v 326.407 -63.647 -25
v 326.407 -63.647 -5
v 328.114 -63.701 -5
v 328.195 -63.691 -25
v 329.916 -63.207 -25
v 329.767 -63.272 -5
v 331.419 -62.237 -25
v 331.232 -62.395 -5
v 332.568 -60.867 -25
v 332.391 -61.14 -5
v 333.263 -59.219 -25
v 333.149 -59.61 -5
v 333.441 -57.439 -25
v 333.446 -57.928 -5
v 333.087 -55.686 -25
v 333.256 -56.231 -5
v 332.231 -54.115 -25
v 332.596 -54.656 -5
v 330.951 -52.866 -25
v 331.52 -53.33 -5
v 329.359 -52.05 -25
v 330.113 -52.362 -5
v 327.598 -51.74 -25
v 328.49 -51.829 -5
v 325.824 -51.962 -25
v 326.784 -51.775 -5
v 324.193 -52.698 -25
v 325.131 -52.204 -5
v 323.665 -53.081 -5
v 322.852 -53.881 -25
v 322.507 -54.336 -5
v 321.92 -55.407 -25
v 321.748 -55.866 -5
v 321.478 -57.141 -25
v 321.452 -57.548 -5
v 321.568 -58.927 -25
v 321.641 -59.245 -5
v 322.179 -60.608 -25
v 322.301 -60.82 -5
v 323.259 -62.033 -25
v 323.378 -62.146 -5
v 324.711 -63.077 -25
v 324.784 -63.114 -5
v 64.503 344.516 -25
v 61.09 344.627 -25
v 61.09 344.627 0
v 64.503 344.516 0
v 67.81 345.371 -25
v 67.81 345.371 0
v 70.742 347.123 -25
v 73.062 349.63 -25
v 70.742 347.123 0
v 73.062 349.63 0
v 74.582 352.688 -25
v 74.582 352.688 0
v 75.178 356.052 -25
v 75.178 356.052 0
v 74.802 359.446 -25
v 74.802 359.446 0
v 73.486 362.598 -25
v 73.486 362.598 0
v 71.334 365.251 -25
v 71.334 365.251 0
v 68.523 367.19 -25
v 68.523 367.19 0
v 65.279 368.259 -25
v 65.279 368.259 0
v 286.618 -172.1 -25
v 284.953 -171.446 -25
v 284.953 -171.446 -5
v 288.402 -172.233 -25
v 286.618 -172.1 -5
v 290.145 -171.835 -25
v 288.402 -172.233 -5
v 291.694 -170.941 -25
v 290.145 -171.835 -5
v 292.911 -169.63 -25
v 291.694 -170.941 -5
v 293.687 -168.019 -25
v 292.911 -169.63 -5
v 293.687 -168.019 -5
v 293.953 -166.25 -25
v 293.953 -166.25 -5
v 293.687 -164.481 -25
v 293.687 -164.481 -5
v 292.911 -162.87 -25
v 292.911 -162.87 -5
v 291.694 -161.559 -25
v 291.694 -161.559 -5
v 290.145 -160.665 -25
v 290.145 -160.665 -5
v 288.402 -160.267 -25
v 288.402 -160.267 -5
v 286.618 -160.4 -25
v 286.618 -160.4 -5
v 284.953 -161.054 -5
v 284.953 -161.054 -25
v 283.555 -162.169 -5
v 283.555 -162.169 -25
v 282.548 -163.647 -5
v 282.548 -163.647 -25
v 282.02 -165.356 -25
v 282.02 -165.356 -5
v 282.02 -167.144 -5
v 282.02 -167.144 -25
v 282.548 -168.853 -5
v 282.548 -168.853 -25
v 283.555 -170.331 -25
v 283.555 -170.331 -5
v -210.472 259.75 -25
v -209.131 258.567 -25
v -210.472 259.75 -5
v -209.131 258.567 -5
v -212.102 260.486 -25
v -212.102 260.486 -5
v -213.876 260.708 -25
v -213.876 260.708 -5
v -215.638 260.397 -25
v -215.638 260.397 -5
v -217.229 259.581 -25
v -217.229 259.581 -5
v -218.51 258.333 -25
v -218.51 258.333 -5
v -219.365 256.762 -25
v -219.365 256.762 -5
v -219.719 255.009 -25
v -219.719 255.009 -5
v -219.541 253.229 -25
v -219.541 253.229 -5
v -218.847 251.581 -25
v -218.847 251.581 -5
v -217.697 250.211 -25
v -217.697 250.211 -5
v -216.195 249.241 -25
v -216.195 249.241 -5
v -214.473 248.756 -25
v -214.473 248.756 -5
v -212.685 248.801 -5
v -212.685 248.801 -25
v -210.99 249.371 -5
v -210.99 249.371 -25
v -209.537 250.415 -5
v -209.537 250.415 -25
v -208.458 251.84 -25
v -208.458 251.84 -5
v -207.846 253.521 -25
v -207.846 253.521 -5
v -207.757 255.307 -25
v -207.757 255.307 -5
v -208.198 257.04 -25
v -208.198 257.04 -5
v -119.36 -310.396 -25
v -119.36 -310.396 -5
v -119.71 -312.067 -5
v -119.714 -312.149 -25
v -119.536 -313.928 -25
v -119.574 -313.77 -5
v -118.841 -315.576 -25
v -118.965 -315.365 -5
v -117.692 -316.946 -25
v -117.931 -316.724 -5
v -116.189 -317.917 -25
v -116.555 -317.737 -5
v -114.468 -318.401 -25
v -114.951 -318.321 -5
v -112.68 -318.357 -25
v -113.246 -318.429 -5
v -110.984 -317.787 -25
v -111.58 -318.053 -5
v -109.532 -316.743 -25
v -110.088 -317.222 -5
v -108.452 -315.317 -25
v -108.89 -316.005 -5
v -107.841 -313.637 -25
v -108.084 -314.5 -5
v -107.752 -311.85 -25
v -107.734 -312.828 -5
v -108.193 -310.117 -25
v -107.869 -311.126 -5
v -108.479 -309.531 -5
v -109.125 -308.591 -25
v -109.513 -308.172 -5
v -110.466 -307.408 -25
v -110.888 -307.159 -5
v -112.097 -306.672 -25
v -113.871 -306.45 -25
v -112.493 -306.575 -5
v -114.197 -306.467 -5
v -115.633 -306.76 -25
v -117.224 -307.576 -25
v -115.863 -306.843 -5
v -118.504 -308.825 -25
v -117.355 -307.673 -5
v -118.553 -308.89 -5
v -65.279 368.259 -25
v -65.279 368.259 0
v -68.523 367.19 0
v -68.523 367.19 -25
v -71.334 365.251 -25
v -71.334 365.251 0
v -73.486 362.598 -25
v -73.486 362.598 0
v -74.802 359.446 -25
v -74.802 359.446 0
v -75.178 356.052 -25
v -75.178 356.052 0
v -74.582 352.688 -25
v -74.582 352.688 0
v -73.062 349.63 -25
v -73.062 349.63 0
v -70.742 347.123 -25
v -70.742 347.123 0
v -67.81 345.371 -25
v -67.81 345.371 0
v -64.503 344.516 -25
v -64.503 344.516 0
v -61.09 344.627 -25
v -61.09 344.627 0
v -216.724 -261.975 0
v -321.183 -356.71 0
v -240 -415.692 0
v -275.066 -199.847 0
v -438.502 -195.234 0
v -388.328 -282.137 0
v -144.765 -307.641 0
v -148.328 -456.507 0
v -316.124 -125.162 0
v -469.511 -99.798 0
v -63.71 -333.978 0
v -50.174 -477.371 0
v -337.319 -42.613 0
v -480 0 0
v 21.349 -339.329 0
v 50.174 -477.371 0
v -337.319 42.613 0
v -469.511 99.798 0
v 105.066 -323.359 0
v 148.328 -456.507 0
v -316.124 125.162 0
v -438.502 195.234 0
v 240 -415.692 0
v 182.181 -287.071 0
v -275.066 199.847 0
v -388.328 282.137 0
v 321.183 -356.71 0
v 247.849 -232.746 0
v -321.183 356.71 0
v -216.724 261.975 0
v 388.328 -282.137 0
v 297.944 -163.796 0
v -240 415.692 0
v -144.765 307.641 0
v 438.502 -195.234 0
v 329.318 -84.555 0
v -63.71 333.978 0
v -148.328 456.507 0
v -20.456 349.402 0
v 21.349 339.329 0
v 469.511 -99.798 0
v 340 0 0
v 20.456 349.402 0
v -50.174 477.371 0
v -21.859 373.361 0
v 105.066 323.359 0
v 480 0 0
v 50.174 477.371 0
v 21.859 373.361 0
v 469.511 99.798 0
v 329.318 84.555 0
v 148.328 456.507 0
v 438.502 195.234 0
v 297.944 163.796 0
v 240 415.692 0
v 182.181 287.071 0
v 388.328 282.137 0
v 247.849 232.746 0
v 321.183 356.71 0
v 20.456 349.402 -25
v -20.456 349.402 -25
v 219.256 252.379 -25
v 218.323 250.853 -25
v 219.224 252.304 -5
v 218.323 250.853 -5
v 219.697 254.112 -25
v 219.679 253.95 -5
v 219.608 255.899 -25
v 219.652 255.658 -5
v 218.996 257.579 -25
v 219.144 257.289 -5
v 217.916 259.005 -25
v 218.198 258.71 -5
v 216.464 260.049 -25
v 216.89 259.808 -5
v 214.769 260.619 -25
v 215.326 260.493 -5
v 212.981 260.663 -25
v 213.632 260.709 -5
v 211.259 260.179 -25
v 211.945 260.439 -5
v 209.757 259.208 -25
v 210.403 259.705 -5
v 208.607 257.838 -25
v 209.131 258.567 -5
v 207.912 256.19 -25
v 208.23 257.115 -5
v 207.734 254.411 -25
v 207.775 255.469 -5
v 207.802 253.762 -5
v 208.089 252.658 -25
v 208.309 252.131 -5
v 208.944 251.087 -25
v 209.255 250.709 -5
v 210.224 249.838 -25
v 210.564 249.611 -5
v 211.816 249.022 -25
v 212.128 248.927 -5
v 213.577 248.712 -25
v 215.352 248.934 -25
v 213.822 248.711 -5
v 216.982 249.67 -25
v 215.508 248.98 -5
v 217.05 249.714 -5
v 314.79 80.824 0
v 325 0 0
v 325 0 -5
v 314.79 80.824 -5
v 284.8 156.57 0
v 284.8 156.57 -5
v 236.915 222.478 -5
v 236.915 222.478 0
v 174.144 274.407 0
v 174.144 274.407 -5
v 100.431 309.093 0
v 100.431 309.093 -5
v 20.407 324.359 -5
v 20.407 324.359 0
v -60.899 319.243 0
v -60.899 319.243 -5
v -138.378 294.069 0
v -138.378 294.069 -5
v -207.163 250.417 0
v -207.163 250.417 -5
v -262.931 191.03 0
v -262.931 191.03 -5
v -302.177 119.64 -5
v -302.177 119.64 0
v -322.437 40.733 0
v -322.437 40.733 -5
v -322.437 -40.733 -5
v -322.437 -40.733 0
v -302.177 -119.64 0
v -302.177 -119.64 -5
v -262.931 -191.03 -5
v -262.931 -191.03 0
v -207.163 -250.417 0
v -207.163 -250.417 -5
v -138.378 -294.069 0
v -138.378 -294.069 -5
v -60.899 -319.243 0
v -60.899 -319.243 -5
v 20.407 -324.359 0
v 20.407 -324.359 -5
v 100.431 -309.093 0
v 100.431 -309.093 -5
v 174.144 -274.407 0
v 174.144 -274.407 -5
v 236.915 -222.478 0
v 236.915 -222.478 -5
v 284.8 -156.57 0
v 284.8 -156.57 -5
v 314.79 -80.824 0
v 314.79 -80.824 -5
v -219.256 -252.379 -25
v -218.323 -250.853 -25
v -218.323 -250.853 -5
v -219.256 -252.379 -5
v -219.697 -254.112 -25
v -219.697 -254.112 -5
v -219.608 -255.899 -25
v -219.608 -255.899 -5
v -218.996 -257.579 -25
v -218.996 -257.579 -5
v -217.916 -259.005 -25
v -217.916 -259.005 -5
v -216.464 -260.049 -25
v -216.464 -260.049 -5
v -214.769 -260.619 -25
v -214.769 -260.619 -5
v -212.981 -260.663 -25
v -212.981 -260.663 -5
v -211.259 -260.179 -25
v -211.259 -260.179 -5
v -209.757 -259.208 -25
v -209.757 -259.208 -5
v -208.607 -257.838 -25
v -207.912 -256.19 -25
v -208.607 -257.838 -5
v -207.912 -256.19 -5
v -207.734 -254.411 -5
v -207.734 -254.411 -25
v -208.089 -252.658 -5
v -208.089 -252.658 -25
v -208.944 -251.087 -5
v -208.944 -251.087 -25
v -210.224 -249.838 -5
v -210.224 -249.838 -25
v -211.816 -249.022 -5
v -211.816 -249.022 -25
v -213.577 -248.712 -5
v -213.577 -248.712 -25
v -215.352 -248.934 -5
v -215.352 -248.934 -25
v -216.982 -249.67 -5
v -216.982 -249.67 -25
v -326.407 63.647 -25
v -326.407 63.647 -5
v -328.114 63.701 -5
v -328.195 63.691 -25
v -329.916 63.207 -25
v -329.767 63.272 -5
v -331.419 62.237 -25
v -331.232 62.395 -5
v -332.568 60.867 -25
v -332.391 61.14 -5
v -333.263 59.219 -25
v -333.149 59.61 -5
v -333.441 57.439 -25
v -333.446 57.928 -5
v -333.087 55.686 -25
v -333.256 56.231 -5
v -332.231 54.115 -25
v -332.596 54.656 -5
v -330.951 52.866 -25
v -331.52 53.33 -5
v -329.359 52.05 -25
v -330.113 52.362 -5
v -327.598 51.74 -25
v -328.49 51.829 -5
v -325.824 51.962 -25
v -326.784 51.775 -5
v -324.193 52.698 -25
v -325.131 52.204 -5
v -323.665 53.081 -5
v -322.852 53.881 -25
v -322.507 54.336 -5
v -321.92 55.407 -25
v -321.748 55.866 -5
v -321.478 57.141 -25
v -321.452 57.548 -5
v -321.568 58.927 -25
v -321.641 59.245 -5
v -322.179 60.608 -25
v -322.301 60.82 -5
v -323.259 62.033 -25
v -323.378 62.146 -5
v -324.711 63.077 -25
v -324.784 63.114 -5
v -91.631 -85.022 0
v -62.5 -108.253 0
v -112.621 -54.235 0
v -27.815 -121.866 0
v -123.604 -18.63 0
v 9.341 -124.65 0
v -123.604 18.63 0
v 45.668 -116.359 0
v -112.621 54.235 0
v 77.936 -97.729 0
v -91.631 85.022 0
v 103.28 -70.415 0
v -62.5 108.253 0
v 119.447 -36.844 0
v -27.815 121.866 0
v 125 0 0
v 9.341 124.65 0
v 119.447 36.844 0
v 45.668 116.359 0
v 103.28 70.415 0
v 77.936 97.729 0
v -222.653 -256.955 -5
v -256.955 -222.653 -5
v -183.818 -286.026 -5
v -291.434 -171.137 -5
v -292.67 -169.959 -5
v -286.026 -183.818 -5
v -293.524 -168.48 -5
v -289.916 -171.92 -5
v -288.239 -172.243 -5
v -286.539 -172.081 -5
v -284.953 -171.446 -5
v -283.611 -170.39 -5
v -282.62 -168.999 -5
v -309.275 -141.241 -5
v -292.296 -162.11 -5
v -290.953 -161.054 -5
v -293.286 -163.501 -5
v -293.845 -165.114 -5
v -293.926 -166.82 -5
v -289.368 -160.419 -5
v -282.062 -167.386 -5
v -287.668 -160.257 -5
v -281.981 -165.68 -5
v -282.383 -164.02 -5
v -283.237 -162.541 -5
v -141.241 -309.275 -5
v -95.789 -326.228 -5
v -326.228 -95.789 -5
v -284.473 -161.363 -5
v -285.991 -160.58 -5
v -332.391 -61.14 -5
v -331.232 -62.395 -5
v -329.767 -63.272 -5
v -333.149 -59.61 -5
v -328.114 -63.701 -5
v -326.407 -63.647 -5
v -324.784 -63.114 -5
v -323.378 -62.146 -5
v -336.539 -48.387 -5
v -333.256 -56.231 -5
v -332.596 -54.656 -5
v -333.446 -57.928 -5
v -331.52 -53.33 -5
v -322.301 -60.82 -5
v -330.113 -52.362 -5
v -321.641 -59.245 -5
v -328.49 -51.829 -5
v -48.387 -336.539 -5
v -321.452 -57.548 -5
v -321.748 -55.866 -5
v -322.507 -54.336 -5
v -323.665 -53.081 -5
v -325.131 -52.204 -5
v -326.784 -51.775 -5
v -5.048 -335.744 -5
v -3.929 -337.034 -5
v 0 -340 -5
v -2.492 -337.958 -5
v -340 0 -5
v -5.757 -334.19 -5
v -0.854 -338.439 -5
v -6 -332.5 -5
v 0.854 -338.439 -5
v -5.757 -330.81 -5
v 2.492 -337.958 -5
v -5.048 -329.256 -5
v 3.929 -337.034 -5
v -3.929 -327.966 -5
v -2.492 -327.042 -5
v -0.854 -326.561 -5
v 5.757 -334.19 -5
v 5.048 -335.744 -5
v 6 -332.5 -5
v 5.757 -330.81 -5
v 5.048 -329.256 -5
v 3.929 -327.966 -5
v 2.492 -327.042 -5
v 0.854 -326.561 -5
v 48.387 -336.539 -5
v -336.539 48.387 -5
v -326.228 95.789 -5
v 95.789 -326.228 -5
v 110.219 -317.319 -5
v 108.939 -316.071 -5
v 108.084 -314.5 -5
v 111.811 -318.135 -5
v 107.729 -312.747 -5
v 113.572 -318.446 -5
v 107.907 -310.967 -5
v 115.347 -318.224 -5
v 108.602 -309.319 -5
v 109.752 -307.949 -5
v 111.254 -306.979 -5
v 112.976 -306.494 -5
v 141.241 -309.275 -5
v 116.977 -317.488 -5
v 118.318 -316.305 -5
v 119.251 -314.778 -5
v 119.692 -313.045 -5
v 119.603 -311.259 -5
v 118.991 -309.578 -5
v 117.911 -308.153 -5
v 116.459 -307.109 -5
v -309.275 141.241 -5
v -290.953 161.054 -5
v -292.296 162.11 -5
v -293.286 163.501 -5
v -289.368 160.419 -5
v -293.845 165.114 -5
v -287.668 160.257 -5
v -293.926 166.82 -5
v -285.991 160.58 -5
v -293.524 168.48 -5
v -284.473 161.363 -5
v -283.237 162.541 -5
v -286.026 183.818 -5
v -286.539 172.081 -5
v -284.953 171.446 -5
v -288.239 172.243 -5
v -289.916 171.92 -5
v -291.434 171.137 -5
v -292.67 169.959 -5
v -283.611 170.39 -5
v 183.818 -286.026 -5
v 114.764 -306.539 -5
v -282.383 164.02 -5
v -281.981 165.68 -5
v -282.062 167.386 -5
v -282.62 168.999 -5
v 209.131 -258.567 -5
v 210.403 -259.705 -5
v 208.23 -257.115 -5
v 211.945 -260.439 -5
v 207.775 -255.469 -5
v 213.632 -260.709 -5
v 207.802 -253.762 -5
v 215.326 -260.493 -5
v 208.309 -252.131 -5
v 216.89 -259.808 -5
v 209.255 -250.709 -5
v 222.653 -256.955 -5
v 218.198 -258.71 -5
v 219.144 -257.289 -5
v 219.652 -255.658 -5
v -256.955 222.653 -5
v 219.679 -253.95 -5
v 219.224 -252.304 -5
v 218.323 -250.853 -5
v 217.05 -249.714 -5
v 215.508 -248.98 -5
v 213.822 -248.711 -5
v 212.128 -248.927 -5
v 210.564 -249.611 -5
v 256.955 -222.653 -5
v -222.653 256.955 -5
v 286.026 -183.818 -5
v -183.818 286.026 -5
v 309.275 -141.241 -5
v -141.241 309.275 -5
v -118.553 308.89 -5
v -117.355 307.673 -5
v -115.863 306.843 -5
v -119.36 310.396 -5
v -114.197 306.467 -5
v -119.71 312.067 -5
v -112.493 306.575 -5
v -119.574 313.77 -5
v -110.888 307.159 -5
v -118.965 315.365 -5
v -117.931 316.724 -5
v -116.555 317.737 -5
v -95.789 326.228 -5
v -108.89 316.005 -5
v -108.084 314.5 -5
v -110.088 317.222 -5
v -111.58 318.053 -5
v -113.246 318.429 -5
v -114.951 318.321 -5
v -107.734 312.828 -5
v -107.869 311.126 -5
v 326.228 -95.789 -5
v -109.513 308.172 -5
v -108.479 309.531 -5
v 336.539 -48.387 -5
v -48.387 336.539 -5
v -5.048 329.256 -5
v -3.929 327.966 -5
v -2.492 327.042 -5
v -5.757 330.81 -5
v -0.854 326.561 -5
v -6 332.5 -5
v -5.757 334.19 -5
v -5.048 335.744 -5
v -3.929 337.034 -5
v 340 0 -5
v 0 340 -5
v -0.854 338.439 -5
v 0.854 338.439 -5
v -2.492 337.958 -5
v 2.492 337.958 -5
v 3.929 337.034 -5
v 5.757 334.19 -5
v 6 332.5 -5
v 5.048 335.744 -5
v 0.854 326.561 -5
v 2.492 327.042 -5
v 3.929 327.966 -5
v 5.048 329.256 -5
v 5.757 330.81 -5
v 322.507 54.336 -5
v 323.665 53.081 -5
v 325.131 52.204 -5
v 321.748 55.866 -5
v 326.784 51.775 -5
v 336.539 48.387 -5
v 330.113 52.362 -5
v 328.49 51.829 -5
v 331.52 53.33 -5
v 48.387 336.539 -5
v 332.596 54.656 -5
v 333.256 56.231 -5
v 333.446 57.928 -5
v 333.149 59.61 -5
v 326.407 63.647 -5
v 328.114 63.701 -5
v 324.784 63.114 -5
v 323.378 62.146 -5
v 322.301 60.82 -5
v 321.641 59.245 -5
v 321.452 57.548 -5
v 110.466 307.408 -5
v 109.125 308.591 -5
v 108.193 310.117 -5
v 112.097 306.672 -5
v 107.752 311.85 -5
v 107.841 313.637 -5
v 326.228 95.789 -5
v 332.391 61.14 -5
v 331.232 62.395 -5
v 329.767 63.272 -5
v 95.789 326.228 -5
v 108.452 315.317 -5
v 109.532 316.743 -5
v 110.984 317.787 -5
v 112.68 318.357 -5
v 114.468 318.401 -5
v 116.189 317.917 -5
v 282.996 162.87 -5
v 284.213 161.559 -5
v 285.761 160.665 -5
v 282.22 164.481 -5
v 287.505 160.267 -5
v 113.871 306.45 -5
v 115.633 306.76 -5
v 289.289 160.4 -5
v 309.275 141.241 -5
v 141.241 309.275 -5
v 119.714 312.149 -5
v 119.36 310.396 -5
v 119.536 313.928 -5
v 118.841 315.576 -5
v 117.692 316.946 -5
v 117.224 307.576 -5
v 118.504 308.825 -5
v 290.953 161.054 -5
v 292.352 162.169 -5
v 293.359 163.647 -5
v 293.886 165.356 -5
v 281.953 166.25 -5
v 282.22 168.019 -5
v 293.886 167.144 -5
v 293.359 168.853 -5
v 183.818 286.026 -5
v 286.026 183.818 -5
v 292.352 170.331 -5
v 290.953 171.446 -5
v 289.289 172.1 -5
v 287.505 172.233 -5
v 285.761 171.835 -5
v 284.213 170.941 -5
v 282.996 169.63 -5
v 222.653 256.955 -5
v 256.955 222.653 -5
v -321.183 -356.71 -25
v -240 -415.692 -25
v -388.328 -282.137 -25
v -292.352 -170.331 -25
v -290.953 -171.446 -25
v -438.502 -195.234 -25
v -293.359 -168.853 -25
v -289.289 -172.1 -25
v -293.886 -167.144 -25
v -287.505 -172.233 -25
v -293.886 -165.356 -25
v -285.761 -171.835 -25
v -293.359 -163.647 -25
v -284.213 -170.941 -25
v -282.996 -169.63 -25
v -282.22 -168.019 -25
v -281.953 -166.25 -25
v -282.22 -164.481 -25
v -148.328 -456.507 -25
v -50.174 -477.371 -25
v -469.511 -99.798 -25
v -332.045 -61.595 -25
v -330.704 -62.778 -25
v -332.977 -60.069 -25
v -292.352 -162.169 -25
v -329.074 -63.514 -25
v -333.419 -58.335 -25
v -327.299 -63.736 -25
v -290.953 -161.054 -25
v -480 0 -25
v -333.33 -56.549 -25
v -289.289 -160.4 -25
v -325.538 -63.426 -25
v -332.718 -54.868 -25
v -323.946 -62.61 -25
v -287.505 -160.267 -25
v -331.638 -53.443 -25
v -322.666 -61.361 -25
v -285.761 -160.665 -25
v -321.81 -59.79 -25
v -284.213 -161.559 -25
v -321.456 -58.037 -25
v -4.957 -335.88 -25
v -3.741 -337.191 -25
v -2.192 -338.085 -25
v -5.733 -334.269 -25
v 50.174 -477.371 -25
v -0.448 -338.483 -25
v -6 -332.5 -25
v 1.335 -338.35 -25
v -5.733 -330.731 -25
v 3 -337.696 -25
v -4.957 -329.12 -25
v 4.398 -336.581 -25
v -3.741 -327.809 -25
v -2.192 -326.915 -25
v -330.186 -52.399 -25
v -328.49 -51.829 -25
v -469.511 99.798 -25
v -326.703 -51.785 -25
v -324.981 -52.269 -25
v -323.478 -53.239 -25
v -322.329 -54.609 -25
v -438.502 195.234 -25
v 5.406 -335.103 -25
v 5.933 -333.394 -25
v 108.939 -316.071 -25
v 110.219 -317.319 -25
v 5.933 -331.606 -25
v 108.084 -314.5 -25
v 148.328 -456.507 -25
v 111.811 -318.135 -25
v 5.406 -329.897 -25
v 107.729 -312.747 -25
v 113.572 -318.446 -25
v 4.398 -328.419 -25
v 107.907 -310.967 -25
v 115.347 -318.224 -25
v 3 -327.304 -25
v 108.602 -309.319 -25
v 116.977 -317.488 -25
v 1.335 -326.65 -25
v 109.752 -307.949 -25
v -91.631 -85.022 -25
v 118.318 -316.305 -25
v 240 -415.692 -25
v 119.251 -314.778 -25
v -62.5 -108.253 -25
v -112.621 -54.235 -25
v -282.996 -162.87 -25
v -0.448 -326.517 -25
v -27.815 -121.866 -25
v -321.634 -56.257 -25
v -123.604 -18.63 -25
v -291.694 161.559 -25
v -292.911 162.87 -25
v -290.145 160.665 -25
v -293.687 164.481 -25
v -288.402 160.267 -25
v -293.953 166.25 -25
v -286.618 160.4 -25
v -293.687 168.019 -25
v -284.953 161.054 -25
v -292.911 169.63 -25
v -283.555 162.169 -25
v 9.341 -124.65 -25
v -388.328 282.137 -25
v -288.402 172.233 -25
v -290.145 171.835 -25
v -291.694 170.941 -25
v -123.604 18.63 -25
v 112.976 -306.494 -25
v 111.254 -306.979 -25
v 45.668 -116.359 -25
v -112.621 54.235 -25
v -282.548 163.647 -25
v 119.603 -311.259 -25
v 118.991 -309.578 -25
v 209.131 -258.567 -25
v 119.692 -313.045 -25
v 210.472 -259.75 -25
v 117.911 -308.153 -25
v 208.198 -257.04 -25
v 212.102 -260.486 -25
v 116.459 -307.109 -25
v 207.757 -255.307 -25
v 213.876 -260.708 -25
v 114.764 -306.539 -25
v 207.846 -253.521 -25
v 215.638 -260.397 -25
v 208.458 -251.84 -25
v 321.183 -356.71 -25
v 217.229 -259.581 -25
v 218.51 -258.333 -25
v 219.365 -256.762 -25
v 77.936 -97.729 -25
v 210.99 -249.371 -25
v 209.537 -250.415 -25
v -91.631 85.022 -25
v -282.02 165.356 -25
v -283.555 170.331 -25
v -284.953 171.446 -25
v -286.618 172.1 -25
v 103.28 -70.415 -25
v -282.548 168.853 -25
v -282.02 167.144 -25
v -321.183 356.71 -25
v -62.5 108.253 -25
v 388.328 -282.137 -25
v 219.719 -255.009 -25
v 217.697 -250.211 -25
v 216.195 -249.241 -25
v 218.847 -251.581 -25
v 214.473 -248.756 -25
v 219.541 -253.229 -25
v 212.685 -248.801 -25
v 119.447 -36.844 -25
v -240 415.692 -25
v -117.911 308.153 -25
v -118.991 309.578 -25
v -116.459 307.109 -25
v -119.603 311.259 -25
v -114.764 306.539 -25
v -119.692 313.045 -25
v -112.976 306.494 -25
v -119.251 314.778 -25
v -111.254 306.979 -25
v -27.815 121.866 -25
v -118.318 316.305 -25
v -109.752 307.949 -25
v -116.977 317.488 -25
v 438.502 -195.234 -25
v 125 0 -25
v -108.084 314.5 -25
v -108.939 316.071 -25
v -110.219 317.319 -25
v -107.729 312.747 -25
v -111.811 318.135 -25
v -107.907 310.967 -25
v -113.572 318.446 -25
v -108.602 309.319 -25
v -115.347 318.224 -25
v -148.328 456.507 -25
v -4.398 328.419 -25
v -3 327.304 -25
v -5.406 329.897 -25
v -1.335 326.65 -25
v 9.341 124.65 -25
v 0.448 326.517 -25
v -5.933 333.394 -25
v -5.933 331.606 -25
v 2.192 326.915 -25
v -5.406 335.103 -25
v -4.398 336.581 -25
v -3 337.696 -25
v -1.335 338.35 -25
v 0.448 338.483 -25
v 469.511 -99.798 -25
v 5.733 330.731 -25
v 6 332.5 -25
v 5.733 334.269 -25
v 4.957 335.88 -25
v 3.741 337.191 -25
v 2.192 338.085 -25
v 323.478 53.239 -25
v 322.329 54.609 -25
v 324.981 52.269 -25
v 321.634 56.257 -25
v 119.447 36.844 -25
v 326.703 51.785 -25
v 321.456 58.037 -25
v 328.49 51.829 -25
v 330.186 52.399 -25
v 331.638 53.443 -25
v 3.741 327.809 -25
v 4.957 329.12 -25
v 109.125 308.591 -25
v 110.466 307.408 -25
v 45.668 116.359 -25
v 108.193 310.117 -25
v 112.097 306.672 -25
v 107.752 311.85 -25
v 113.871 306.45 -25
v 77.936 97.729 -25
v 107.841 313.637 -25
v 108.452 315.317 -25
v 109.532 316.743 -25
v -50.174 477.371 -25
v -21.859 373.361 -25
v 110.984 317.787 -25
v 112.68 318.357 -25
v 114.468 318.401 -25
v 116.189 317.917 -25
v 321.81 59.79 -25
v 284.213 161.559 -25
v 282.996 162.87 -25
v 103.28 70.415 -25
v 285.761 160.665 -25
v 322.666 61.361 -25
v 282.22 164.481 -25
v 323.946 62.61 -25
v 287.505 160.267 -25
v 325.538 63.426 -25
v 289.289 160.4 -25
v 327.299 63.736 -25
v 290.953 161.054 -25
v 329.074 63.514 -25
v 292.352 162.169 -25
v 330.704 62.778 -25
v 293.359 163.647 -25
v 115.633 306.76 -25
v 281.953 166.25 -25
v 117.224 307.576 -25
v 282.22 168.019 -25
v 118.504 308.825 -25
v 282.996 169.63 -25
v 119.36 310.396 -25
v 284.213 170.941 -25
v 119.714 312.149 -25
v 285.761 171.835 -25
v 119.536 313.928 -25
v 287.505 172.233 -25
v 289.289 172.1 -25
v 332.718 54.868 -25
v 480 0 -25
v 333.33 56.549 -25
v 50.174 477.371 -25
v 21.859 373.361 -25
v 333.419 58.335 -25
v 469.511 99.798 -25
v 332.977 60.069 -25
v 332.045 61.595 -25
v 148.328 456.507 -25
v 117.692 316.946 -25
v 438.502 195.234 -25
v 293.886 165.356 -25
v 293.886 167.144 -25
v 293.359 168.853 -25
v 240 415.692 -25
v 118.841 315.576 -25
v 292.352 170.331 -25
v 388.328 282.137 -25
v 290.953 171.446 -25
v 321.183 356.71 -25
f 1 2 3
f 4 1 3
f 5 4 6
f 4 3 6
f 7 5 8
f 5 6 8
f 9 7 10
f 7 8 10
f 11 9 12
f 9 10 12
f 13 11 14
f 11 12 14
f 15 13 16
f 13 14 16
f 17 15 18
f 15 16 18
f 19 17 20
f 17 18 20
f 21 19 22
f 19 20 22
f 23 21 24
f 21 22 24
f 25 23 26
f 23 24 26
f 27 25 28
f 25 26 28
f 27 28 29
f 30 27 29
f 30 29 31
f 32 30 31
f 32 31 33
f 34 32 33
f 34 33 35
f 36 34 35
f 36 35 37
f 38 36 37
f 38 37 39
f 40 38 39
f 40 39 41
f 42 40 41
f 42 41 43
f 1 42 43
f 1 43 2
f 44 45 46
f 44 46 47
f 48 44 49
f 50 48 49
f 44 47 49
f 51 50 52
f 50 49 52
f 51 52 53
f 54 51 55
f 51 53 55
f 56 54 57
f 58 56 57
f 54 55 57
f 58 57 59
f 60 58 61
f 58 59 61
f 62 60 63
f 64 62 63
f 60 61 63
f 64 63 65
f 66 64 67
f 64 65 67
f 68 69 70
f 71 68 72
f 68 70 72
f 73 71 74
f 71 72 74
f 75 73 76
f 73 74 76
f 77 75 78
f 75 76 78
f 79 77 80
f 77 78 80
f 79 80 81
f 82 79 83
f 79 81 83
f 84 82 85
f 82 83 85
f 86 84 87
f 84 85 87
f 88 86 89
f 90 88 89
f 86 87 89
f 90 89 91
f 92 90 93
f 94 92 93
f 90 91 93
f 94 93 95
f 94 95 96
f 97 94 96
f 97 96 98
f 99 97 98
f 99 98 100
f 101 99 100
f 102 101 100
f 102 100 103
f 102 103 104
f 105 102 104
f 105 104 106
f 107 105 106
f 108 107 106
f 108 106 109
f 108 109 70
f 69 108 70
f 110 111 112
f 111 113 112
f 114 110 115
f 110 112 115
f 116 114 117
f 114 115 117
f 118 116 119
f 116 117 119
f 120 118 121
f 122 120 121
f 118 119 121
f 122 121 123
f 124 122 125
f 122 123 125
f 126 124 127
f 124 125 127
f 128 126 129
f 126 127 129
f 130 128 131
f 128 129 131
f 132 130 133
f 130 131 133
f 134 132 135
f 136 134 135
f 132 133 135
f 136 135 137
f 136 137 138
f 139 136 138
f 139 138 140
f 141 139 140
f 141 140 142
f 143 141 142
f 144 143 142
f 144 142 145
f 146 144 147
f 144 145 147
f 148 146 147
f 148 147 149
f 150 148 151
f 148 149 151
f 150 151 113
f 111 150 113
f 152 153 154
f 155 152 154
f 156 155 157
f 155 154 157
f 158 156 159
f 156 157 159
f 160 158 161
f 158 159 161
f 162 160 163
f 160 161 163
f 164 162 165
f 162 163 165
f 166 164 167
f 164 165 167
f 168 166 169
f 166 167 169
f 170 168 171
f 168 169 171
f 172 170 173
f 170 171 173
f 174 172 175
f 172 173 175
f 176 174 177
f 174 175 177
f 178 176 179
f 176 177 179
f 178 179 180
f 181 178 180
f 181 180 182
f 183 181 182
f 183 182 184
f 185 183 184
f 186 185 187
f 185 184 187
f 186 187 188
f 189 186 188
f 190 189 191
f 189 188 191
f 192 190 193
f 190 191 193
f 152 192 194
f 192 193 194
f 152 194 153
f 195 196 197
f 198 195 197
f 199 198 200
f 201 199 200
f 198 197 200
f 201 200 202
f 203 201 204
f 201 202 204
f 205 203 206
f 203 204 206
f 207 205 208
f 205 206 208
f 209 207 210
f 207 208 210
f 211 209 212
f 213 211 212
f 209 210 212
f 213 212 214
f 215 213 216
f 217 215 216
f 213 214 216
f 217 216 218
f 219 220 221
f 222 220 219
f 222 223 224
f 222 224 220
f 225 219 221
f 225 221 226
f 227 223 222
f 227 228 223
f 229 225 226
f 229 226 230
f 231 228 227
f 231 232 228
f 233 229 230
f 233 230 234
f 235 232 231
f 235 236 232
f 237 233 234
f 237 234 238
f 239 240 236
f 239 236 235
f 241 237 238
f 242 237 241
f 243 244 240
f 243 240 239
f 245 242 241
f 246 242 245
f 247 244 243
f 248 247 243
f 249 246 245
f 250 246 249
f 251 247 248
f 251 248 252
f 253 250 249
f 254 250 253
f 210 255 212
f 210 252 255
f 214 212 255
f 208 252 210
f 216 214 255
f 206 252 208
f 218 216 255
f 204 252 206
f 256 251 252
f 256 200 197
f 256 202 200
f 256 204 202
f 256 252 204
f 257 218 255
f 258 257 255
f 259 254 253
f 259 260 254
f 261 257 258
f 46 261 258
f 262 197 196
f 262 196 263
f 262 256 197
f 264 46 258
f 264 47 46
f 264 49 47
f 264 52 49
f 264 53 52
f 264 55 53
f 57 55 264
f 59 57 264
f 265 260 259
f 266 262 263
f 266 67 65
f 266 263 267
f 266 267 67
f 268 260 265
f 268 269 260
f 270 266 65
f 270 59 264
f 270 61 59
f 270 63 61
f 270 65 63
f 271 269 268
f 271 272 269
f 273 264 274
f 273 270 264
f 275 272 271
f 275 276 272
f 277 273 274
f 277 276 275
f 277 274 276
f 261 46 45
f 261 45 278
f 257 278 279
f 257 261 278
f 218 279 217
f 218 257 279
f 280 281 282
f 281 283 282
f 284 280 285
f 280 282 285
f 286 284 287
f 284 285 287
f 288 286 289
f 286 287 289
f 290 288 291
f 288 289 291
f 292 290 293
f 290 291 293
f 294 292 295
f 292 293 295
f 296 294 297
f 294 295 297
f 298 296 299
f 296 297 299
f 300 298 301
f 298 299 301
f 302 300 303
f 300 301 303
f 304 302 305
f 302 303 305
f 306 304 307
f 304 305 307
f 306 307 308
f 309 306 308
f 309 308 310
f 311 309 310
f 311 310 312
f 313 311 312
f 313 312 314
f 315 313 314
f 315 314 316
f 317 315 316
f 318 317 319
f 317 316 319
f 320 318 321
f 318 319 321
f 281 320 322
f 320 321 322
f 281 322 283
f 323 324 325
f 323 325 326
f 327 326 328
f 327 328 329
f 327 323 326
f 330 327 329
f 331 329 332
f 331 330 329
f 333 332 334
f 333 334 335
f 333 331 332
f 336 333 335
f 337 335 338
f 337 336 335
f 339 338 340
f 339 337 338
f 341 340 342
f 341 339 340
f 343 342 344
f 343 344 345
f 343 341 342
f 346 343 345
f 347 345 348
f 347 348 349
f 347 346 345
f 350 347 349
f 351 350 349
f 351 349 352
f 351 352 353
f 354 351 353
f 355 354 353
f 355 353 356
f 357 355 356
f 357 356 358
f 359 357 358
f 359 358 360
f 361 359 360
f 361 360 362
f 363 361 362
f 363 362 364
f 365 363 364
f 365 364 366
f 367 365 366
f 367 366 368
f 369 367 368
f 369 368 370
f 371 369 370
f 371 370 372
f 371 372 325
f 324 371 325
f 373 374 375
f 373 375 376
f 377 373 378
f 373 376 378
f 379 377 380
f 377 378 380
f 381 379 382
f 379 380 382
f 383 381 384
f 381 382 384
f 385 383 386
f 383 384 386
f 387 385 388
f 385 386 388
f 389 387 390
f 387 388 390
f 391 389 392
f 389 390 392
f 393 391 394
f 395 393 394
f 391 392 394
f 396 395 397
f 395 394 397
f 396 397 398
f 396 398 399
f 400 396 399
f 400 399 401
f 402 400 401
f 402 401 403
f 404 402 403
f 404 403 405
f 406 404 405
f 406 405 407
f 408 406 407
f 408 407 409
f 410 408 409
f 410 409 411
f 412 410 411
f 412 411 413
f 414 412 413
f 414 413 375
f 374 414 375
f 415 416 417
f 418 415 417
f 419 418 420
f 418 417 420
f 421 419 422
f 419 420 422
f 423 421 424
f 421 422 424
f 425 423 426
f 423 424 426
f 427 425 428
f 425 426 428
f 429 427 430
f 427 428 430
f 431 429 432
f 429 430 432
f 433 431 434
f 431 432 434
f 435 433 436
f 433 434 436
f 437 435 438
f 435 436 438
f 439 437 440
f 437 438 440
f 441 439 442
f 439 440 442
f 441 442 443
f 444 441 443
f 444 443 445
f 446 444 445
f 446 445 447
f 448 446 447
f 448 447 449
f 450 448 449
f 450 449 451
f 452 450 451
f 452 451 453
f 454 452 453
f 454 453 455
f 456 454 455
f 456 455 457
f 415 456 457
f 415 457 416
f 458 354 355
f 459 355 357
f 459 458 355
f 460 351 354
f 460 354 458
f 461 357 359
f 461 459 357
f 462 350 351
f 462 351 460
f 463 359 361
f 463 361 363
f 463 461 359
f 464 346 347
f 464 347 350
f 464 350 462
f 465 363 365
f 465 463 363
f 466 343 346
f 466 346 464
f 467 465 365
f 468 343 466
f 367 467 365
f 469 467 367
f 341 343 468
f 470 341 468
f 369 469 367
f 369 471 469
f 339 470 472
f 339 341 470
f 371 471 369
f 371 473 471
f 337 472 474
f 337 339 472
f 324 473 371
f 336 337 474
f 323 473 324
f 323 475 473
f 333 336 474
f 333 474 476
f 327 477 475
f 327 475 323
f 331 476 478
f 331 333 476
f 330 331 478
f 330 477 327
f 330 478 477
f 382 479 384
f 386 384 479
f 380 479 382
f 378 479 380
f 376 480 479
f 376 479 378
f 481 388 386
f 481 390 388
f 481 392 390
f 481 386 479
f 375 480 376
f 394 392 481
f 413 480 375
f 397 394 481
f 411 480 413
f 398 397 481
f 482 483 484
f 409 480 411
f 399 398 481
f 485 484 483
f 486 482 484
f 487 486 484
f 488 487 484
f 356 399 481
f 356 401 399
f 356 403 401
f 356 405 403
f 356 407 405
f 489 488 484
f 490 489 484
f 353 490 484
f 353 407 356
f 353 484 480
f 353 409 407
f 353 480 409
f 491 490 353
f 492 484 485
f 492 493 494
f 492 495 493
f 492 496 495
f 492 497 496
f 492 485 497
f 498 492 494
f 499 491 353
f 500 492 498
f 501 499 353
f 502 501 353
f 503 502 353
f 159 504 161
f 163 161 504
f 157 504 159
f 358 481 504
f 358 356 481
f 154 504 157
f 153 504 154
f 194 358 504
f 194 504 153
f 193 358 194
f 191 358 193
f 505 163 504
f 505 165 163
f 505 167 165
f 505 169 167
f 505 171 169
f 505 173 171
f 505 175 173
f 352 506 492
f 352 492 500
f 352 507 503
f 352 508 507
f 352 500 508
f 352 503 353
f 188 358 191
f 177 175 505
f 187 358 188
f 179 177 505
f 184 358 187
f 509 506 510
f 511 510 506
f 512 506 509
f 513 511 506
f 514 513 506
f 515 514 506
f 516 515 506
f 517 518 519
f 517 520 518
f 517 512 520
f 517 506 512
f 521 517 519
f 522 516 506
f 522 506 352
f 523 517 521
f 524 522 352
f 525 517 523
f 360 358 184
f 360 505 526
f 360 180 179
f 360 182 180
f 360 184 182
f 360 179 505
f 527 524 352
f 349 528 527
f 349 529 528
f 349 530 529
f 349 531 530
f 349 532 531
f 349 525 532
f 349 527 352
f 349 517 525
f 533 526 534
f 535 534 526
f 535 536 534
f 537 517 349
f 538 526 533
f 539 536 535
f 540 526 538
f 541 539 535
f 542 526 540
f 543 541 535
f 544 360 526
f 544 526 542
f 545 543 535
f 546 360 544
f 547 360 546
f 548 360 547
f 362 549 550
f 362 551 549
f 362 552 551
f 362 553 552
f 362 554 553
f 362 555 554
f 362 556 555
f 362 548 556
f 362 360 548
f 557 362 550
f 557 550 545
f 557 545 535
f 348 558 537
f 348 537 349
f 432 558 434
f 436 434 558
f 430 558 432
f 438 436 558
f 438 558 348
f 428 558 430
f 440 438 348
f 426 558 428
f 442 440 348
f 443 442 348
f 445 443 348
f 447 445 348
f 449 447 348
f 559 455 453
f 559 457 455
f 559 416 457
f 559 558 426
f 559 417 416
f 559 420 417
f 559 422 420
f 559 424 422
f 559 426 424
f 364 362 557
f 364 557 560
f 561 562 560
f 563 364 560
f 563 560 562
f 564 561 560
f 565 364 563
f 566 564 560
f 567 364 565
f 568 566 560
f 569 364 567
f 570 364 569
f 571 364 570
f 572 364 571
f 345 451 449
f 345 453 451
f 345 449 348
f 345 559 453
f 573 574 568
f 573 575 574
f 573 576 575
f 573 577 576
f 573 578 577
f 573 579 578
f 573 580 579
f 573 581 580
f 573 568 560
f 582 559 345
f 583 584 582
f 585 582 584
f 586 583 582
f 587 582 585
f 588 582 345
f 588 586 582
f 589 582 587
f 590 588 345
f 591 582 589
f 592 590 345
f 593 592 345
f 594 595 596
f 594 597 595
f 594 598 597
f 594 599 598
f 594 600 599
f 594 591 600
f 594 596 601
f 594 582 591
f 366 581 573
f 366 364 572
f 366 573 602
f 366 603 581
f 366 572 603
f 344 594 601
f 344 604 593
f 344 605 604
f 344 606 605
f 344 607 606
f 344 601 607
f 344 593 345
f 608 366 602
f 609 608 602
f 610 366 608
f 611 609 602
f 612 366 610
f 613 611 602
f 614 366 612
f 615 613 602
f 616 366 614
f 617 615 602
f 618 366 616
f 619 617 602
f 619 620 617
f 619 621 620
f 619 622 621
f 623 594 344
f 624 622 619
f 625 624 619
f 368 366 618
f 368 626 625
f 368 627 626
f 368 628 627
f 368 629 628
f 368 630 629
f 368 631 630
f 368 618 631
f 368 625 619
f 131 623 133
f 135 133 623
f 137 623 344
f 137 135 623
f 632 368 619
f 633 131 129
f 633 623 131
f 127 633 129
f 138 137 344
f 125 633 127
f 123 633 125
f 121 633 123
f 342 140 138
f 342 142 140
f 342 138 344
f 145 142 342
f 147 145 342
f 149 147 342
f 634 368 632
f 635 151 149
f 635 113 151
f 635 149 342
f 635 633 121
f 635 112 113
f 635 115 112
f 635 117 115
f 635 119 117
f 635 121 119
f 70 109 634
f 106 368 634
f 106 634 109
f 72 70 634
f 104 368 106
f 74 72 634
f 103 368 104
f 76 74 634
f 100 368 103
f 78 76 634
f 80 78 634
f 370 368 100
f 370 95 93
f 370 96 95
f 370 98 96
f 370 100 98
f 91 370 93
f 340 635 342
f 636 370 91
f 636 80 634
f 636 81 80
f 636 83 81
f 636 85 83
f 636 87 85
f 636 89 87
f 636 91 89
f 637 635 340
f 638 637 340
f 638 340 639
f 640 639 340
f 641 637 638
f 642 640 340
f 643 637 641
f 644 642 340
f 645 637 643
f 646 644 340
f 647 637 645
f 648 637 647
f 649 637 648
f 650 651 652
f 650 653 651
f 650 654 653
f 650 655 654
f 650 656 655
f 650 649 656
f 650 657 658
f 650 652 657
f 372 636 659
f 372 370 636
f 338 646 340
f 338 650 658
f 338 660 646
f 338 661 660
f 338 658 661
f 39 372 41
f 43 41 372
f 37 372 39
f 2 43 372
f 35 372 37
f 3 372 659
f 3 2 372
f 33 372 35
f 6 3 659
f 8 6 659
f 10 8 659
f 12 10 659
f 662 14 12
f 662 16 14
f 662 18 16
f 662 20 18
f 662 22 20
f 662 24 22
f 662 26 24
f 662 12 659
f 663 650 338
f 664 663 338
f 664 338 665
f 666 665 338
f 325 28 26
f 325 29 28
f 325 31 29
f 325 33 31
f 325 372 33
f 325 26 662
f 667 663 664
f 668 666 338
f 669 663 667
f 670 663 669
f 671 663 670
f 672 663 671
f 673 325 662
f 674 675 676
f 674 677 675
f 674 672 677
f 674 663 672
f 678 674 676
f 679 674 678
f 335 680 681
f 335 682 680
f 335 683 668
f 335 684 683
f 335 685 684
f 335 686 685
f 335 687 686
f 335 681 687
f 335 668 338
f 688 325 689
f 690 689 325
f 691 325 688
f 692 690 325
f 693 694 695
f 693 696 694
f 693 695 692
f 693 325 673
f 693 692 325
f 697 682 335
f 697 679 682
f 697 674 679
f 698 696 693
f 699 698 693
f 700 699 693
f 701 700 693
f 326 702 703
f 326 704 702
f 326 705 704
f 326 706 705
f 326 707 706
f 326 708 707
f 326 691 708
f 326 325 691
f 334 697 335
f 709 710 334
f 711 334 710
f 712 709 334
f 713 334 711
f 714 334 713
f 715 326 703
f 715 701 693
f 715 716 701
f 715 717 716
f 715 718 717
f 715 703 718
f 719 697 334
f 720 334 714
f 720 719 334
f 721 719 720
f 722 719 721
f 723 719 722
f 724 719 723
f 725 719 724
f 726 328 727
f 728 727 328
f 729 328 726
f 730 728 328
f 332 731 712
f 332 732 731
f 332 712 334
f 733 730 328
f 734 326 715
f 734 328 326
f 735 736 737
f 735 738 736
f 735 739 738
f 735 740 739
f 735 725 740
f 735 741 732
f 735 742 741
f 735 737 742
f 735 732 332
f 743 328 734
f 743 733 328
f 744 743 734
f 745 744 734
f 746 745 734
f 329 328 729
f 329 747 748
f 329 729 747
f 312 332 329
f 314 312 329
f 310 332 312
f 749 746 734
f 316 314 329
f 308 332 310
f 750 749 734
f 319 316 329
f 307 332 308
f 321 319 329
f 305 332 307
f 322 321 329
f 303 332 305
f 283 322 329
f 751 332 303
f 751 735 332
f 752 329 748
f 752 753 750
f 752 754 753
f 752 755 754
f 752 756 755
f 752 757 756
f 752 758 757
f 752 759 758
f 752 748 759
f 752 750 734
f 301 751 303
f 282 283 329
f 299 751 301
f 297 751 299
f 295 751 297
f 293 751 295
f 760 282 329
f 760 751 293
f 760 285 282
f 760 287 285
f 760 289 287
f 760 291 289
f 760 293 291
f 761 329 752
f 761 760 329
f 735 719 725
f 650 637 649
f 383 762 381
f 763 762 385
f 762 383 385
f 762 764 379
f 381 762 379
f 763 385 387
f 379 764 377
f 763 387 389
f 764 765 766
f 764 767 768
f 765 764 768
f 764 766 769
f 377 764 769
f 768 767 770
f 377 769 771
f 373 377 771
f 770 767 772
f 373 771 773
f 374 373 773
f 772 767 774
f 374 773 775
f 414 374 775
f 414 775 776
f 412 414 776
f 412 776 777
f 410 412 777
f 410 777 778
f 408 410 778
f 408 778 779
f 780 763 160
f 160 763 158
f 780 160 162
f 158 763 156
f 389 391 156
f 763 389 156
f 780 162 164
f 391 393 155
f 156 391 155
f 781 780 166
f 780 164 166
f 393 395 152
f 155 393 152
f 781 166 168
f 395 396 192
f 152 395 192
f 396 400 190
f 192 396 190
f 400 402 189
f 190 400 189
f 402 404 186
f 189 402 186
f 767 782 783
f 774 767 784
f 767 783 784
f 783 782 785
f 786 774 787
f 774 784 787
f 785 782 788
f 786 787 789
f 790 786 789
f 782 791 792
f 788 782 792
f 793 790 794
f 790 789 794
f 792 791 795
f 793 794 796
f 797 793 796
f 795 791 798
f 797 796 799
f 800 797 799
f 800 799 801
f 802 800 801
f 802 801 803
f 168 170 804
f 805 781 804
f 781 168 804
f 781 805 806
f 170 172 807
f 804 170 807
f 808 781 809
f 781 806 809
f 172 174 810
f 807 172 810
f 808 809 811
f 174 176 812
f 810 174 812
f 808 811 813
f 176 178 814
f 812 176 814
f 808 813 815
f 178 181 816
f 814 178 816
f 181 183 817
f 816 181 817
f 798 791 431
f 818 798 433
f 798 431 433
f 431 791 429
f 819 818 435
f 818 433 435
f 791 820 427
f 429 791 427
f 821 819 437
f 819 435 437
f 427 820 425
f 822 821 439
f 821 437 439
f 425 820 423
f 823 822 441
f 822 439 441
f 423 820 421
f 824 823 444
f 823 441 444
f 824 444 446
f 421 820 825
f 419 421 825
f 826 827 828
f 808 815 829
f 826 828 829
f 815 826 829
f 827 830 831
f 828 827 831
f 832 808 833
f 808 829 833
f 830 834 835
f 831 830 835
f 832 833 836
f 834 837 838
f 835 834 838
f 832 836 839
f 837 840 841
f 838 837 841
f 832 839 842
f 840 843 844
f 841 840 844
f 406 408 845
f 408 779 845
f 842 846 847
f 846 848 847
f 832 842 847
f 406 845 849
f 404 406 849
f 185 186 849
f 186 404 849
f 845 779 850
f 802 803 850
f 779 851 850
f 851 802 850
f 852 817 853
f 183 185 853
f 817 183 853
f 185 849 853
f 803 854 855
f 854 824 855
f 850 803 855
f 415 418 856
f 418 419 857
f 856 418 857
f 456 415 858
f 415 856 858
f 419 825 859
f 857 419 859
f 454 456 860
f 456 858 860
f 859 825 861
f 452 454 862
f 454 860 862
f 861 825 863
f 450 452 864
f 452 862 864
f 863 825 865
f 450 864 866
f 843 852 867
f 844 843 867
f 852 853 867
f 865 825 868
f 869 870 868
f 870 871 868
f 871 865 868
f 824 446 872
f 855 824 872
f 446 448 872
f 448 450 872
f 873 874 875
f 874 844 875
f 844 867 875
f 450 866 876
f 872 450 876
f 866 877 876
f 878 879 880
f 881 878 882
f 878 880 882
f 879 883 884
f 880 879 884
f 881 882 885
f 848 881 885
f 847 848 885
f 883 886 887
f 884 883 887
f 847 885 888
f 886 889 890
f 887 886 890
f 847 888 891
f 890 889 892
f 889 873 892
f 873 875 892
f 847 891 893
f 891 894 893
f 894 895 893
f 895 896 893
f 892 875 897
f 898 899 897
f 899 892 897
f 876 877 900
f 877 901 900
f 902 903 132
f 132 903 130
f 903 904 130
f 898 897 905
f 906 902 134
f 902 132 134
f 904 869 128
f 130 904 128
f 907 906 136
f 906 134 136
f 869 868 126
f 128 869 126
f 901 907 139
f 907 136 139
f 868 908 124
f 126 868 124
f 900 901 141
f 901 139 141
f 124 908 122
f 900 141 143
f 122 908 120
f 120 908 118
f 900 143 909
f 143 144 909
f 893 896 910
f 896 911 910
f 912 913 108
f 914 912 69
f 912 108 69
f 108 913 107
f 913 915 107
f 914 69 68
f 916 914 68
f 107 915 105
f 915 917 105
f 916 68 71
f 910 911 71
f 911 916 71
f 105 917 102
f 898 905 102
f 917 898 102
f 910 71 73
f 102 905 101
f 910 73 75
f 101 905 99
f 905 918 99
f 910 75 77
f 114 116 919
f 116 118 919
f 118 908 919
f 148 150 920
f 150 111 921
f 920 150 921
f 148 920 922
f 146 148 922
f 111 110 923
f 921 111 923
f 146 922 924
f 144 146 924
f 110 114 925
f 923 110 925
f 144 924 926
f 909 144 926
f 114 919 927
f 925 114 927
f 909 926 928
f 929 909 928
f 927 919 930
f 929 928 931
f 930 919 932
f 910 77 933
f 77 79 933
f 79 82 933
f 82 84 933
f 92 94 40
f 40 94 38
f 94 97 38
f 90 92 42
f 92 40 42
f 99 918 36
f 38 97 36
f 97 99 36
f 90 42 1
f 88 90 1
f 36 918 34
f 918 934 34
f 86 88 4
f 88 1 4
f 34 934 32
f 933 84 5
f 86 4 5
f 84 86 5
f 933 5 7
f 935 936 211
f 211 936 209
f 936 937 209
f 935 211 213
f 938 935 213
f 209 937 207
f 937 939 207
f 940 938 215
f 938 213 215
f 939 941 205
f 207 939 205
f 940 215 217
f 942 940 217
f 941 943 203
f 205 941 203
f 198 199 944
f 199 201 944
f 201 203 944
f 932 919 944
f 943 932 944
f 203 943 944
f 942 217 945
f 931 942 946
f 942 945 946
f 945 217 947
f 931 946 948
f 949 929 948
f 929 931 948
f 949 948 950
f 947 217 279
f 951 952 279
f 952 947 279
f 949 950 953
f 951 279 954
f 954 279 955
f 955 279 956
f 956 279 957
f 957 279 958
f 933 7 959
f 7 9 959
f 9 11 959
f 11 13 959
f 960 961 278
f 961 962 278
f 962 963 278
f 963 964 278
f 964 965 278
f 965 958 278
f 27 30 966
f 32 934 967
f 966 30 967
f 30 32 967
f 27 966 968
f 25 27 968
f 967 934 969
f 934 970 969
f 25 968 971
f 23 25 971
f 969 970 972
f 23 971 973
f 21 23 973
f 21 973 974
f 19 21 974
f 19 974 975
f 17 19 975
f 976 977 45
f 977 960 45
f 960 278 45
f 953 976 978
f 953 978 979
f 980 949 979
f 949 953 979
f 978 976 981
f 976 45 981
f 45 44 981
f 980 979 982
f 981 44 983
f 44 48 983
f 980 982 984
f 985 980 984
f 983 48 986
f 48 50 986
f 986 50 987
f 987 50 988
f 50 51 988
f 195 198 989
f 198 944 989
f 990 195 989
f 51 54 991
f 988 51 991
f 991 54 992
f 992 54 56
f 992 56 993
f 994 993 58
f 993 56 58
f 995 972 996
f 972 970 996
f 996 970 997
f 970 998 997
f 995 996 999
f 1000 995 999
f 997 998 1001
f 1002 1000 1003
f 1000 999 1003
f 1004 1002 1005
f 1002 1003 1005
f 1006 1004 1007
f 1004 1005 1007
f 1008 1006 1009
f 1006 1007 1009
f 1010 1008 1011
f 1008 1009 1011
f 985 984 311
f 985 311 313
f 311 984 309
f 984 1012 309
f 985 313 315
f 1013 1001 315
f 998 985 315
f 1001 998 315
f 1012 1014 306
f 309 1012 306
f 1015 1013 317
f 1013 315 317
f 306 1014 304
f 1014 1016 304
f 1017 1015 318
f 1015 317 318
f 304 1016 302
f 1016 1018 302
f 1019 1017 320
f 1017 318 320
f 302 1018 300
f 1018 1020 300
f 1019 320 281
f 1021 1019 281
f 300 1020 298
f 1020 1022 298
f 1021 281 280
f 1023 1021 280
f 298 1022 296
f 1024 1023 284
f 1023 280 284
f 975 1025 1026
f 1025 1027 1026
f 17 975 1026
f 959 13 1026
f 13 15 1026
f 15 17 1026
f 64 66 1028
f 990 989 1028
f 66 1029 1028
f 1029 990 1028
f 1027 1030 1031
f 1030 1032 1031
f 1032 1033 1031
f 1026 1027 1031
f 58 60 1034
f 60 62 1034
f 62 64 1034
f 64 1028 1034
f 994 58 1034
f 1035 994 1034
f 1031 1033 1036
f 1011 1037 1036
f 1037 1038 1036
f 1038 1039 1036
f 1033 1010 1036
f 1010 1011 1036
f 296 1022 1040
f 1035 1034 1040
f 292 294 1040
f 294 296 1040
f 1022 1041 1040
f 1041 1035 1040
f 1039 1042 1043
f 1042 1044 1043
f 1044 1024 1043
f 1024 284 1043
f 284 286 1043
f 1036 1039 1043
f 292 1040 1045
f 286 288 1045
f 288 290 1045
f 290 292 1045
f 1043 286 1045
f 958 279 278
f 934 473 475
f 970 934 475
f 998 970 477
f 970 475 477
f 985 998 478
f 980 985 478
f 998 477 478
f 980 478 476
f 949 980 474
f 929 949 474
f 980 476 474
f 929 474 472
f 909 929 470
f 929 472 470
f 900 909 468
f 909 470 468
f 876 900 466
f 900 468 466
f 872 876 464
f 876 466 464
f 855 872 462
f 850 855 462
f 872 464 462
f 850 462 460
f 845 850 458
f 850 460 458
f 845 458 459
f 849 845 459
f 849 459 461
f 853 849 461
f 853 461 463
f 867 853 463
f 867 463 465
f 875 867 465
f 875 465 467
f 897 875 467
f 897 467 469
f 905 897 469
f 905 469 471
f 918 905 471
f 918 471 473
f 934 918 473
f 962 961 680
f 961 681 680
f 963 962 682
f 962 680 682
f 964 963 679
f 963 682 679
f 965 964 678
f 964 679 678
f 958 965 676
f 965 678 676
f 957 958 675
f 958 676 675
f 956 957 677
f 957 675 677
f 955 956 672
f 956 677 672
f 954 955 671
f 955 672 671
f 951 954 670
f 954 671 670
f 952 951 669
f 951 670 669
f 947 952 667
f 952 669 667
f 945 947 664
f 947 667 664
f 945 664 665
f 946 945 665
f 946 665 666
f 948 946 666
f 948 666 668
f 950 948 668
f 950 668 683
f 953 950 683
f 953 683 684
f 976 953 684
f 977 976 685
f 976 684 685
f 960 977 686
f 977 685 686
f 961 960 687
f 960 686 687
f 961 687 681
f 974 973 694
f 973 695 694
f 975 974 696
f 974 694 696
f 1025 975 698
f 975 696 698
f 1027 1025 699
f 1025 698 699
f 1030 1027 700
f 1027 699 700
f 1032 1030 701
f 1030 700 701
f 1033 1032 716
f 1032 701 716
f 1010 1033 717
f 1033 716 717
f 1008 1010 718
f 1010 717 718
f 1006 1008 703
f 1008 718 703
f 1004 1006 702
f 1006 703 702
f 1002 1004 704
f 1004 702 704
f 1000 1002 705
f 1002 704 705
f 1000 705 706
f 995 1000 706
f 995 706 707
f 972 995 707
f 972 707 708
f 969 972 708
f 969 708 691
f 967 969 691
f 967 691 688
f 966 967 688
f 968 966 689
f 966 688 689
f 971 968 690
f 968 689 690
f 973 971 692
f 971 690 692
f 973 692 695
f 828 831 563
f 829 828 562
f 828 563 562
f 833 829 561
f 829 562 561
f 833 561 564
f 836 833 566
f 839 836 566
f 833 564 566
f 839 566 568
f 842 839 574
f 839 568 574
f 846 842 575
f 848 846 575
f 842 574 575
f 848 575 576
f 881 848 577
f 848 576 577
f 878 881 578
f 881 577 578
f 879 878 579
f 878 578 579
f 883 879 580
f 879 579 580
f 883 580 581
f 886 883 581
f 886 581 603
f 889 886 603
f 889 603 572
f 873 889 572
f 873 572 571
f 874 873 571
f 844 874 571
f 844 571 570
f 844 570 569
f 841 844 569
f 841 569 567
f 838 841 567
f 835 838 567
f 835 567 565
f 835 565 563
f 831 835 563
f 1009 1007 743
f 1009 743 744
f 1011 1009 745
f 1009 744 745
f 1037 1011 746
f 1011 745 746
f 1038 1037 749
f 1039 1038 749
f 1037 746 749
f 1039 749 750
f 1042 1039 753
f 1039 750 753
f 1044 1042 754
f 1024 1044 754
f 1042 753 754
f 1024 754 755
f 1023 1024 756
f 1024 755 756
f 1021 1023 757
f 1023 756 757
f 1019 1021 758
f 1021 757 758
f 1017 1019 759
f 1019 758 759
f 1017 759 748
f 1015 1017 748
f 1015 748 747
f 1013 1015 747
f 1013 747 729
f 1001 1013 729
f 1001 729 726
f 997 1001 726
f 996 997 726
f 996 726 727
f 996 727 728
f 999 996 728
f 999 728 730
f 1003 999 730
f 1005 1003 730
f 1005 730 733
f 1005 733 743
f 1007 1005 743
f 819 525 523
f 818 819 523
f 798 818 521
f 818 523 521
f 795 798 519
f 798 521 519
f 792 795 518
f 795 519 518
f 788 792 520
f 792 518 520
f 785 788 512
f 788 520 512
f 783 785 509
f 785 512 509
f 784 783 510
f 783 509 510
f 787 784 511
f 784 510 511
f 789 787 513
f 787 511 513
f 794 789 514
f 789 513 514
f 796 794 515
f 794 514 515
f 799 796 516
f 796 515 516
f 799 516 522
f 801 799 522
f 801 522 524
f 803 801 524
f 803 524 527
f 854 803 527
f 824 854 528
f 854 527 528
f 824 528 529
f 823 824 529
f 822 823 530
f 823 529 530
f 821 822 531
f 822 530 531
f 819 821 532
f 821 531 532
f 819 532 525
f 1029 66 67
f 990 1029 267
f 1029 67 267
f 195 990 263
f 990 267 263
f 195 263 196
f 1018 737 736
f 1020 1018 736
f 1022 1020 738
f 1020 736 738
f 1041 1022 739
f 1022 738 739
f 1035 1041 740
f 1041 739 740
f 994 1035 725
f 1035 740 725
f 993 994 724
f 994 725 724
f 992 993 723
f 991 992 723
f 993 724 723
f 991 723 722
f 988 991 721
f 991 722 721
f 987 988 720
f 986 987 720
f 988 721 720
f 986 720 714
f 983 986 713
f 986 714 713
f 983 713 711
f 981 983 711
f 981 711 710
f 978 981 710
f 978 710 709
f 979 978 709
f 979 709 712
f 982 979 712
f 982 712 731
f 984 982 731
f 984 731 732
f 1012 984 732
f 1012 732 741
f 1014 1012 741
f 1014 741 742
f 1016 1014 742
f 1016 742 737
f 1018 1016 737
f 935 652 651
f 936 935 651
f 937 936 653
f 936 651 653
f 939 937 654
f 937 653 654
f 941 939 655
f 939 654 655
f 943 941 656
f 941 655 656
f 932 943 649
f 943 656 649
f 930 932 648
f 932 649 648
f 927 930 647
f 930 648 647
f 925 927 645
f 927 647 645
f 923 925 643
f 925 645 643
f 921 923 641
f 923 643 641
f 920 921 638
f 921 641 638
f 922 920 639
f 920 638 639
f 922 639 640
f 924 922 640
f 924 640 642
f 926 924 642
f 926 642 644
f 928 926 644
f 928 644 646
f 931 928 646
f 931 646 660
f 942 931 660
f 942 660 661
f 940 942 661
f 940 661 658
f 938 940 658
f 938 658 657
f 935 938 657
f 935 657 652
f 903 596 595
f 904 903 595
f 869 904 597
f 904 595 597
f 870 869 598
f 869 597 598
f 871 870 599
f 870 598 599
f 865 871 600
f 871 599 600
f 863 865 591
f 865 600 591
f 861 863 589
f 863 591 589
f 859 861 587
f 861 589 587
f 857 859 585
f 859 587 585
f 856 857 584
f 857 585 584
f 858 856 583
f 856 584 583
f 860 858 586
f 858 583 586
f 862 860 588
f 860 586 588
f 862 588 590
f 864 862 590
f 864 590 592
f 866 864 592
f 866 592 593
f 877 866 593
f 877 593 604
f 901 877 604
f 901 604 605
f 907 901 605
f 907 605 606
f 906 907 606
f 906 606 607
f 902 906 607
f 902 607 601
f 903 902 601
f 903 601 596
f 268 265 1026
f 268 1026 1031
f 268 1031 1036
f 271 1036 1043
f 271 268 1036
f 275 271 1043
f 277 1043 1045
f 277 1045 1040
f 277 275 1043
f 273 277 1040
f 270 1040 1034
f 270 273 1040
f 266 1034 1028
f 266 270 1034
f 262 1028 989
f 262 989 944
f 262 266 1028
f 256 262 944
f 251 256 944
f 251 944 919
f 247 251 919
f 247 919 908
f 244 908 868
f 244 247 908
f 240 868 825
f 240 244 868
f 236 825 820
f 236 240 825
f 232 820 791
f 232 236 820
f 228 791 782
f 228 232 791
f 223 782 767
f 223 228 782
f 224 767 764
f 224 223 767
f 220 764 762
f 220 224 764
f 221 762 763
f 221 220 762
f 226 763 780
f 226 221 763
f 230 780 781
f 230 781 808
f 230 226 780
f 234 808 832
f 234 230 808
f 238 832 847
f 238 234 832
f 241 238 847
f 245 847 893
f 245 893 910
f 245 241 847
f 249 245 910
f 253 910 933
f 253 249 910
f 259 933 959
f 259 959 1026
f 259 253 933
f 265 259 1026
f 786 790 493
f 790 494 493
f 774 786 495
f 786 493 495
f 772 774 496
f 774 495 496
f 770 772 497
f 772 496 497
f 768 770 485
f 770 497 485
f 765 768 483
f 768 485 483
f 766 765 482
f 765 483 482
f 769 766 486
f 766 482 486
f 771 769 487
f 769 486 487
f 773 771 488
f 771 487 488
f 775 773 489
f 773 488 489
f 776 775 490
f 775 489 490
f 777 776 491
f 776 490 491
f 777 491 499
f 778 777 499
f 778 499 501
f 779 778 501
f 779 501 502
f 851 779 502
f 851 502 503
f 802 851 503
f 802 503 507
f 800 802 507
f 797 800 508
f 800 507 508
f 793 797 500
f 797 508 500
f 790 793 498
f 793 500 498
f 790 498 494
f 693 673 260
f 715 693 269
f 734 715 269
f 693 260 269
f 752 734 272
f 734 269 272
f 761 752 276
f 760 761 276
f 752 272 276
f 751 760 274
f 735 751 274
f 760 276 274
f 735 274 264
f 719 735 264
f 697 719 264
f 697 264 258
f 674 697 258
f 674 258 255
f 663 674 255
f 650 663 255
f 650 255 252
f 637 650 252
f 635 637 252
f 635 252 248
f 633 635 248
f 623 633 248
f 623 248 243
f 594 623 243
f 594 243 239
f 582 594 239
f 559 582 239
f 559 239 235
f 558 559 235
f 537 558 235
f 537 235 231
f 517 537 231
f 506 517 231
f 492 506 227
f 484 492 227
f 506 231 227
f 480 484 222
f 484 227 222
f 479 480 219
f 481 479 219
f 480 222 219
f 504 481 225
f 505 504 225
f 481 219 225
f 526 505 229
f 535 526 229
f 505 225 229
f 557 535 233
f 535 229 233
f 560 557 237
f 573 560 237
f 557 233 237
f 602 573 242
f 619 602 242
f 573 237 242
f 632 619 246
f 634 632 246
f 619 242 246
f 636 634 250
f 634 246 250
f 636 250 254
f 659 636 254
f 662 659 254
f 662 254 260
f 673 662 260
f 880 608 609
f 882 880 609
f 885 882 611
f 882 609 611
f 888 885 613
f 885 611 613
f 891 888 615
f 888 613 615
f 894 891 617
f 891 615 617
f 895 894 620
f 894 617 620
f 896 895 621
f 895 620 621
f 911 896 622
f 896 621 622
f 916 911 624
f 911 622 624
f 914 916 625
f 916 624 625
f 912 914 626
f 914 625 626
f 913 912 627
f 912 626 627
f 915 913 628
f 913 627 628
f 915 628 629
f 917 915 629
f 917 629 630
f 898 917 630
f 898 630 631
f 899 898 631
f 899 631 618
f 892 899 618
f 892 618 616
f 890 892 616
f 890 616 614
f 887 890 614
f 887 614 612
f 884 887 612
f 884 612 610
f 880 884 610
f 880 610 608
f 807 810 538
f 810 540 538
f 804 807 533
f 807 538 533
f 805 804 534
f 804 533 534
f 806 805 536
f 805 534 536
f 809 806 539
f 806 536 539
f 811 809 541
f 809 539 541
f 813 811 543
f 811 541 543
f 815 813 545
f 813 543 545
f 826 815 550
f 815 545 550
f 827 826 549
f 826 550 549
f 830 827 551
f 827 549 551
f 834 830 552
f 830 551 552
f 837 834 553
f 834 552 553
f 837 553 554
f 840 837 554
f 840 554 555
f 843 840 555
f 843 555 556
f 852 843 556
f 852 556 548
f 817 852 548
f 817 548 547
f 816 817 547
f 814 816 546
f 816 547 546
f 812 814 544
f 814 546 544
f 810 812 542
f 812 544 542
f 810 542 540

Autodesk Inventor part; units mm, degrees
ref_plane "YZ Plane" through (0, 0, 0) normal (1, 0, 0) x (0, 1, 0)
ref_plane "XZ Plane" through (0, 0, 0) normal (0, 1, 0) x (-1, 0, 0)
ref_plane "XY Plane" through (0, 0, 0) normal (0, 0, 1) x (1, 0, 0)
sketch "Boceto1" plane through (0, 0, 0) normal (0, 0, 1) x (1, 0, 0)
  circle A0 centre (0, 0) radius 480
  circle A1 centre (0, 0) radius 125
  dimension "d0" = 960
  dimension "d1" = 250
extrude "Extrusión1" add sketch "Boceto1" against normal blind 25
sketch "Boceto2" plane through (0, 0, 0) normal (0, 0, 1) x (1, 0, 0)
  circle A0 centre (0, 0) radius 325
  circle A1 centre (0, 0) radius 340
  dimension "d4" = 680
  dimension "d5" = 650
extrude "Extrusión2" cut sketch "Boceto2" against normal blind 5
sketch "Boceto3" plane through (0, 0, 0) normal (0, 0, 1) x (1, 0, 0)
  arc A0 (63.1842, 356.4432) -> (-63.1842, 356.4432) centre (0, 0) ccw construction
  arc A1 (65.2787, 368.259) -> (-65.2787, 368.259) centre (0, 0) ccw
  arc A2 (61.0897, 344.6274) -> (-61.0897, 344.6274) centre (0, 0) ccw
  arc A3 (61.0897, 344.6274) -> (65.2787, 368.259) centre (63.1842, 356.4432) ccw
  arc A4 (-65.2787, 368.259) -> (-61.0897, 344.6274) centre (-63.1842, 356.4432) ccw
  line L0 (0, -74.8) -> (0, 448.8) projected
  point P0 (75, 354.3487)
  point P1 (-75, 354.3487)
  point P2 (0, 362)
  dimension "d8" = 12
  dimension "d9" = 362
  dimension "d15" = 150
extrude "Extrusión3" cut sketch "Boceto3" against normal up to next
sketch "Boceto4" plane through (0, 0, 0) normal (0, 0, 1) x (1, 0, 0)
  circle A0 centre (0, 0) radius 332.5 construction
  circle A1 centre (0, 332.5) radius 6
  dimension "d18" = 665
  dimension "d19" = 12
extrude "Extrusión4" cut sketch "Boceto4" against normal through all
pattern_circular "Patrón circular1" count 18 over 360 about axis through (0, 0, -10) along (0, 0, 1) of "Extrusión4"
properties part number "Brida_1 (flange_1)"
